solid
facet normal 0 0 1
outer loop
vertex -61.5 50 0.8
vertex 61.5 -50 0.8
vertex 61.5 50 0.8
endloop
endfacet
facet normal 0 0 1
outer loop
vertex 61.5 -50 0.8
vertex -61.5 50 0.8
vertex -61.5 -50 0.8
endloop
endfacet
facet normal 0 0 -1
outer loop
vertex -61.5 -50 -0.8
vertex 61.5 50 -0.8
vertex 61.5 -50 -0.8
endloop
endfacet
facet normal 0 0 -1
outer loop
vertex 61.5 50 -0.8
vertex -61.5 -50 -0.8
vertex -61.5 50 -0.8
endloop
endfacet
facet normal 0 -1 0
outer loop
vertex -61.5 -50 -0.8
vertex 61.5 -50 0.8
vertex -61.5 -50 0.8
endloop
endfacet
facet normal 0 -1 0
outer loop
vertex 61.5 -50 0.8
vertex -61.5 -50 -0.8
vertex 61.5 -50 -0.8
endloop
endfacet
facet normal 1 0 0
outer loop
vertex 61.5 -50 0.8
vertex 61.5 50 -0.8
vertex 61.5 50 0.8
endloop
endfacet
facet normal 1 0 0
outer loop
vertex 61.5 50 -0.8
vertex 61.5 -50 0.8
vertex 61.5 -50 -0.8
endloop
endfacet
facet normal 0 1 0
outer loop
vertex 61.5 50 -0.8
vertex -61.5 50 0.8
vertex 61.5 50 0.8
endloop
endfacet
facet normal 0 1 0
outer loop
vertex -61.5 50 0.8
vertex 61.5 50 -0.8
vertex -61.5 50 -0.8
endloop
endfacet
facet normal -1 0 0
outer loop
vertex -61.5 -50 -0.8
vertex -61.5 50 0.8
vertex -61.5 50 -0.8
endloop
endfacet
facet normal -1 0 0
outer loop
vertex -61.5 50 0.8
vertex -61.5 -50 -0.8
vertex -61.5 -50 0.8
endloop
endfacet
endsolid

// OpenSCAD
// Parameters
pcb_length = 123; //[61.5:246:0.5]
pcb_width = 100; //[50:200:0.5]
pcb_thickness = 1.6; //[0.8:3.2:0.1]

// PCB Main Body
module pcb_main_body() {
  color([0.0, 0.4, 0.2]) // Green color for PCB
  translate([0, 0, 0])
    cube([pcb_length, pcb_width, pcb_thickness], center=true);
}

// Complete PCB Model
module pcb_complete_model() {
  union() {
    pcb_main_body();
  }
}

// Render the final model
pcb_complete_model();
